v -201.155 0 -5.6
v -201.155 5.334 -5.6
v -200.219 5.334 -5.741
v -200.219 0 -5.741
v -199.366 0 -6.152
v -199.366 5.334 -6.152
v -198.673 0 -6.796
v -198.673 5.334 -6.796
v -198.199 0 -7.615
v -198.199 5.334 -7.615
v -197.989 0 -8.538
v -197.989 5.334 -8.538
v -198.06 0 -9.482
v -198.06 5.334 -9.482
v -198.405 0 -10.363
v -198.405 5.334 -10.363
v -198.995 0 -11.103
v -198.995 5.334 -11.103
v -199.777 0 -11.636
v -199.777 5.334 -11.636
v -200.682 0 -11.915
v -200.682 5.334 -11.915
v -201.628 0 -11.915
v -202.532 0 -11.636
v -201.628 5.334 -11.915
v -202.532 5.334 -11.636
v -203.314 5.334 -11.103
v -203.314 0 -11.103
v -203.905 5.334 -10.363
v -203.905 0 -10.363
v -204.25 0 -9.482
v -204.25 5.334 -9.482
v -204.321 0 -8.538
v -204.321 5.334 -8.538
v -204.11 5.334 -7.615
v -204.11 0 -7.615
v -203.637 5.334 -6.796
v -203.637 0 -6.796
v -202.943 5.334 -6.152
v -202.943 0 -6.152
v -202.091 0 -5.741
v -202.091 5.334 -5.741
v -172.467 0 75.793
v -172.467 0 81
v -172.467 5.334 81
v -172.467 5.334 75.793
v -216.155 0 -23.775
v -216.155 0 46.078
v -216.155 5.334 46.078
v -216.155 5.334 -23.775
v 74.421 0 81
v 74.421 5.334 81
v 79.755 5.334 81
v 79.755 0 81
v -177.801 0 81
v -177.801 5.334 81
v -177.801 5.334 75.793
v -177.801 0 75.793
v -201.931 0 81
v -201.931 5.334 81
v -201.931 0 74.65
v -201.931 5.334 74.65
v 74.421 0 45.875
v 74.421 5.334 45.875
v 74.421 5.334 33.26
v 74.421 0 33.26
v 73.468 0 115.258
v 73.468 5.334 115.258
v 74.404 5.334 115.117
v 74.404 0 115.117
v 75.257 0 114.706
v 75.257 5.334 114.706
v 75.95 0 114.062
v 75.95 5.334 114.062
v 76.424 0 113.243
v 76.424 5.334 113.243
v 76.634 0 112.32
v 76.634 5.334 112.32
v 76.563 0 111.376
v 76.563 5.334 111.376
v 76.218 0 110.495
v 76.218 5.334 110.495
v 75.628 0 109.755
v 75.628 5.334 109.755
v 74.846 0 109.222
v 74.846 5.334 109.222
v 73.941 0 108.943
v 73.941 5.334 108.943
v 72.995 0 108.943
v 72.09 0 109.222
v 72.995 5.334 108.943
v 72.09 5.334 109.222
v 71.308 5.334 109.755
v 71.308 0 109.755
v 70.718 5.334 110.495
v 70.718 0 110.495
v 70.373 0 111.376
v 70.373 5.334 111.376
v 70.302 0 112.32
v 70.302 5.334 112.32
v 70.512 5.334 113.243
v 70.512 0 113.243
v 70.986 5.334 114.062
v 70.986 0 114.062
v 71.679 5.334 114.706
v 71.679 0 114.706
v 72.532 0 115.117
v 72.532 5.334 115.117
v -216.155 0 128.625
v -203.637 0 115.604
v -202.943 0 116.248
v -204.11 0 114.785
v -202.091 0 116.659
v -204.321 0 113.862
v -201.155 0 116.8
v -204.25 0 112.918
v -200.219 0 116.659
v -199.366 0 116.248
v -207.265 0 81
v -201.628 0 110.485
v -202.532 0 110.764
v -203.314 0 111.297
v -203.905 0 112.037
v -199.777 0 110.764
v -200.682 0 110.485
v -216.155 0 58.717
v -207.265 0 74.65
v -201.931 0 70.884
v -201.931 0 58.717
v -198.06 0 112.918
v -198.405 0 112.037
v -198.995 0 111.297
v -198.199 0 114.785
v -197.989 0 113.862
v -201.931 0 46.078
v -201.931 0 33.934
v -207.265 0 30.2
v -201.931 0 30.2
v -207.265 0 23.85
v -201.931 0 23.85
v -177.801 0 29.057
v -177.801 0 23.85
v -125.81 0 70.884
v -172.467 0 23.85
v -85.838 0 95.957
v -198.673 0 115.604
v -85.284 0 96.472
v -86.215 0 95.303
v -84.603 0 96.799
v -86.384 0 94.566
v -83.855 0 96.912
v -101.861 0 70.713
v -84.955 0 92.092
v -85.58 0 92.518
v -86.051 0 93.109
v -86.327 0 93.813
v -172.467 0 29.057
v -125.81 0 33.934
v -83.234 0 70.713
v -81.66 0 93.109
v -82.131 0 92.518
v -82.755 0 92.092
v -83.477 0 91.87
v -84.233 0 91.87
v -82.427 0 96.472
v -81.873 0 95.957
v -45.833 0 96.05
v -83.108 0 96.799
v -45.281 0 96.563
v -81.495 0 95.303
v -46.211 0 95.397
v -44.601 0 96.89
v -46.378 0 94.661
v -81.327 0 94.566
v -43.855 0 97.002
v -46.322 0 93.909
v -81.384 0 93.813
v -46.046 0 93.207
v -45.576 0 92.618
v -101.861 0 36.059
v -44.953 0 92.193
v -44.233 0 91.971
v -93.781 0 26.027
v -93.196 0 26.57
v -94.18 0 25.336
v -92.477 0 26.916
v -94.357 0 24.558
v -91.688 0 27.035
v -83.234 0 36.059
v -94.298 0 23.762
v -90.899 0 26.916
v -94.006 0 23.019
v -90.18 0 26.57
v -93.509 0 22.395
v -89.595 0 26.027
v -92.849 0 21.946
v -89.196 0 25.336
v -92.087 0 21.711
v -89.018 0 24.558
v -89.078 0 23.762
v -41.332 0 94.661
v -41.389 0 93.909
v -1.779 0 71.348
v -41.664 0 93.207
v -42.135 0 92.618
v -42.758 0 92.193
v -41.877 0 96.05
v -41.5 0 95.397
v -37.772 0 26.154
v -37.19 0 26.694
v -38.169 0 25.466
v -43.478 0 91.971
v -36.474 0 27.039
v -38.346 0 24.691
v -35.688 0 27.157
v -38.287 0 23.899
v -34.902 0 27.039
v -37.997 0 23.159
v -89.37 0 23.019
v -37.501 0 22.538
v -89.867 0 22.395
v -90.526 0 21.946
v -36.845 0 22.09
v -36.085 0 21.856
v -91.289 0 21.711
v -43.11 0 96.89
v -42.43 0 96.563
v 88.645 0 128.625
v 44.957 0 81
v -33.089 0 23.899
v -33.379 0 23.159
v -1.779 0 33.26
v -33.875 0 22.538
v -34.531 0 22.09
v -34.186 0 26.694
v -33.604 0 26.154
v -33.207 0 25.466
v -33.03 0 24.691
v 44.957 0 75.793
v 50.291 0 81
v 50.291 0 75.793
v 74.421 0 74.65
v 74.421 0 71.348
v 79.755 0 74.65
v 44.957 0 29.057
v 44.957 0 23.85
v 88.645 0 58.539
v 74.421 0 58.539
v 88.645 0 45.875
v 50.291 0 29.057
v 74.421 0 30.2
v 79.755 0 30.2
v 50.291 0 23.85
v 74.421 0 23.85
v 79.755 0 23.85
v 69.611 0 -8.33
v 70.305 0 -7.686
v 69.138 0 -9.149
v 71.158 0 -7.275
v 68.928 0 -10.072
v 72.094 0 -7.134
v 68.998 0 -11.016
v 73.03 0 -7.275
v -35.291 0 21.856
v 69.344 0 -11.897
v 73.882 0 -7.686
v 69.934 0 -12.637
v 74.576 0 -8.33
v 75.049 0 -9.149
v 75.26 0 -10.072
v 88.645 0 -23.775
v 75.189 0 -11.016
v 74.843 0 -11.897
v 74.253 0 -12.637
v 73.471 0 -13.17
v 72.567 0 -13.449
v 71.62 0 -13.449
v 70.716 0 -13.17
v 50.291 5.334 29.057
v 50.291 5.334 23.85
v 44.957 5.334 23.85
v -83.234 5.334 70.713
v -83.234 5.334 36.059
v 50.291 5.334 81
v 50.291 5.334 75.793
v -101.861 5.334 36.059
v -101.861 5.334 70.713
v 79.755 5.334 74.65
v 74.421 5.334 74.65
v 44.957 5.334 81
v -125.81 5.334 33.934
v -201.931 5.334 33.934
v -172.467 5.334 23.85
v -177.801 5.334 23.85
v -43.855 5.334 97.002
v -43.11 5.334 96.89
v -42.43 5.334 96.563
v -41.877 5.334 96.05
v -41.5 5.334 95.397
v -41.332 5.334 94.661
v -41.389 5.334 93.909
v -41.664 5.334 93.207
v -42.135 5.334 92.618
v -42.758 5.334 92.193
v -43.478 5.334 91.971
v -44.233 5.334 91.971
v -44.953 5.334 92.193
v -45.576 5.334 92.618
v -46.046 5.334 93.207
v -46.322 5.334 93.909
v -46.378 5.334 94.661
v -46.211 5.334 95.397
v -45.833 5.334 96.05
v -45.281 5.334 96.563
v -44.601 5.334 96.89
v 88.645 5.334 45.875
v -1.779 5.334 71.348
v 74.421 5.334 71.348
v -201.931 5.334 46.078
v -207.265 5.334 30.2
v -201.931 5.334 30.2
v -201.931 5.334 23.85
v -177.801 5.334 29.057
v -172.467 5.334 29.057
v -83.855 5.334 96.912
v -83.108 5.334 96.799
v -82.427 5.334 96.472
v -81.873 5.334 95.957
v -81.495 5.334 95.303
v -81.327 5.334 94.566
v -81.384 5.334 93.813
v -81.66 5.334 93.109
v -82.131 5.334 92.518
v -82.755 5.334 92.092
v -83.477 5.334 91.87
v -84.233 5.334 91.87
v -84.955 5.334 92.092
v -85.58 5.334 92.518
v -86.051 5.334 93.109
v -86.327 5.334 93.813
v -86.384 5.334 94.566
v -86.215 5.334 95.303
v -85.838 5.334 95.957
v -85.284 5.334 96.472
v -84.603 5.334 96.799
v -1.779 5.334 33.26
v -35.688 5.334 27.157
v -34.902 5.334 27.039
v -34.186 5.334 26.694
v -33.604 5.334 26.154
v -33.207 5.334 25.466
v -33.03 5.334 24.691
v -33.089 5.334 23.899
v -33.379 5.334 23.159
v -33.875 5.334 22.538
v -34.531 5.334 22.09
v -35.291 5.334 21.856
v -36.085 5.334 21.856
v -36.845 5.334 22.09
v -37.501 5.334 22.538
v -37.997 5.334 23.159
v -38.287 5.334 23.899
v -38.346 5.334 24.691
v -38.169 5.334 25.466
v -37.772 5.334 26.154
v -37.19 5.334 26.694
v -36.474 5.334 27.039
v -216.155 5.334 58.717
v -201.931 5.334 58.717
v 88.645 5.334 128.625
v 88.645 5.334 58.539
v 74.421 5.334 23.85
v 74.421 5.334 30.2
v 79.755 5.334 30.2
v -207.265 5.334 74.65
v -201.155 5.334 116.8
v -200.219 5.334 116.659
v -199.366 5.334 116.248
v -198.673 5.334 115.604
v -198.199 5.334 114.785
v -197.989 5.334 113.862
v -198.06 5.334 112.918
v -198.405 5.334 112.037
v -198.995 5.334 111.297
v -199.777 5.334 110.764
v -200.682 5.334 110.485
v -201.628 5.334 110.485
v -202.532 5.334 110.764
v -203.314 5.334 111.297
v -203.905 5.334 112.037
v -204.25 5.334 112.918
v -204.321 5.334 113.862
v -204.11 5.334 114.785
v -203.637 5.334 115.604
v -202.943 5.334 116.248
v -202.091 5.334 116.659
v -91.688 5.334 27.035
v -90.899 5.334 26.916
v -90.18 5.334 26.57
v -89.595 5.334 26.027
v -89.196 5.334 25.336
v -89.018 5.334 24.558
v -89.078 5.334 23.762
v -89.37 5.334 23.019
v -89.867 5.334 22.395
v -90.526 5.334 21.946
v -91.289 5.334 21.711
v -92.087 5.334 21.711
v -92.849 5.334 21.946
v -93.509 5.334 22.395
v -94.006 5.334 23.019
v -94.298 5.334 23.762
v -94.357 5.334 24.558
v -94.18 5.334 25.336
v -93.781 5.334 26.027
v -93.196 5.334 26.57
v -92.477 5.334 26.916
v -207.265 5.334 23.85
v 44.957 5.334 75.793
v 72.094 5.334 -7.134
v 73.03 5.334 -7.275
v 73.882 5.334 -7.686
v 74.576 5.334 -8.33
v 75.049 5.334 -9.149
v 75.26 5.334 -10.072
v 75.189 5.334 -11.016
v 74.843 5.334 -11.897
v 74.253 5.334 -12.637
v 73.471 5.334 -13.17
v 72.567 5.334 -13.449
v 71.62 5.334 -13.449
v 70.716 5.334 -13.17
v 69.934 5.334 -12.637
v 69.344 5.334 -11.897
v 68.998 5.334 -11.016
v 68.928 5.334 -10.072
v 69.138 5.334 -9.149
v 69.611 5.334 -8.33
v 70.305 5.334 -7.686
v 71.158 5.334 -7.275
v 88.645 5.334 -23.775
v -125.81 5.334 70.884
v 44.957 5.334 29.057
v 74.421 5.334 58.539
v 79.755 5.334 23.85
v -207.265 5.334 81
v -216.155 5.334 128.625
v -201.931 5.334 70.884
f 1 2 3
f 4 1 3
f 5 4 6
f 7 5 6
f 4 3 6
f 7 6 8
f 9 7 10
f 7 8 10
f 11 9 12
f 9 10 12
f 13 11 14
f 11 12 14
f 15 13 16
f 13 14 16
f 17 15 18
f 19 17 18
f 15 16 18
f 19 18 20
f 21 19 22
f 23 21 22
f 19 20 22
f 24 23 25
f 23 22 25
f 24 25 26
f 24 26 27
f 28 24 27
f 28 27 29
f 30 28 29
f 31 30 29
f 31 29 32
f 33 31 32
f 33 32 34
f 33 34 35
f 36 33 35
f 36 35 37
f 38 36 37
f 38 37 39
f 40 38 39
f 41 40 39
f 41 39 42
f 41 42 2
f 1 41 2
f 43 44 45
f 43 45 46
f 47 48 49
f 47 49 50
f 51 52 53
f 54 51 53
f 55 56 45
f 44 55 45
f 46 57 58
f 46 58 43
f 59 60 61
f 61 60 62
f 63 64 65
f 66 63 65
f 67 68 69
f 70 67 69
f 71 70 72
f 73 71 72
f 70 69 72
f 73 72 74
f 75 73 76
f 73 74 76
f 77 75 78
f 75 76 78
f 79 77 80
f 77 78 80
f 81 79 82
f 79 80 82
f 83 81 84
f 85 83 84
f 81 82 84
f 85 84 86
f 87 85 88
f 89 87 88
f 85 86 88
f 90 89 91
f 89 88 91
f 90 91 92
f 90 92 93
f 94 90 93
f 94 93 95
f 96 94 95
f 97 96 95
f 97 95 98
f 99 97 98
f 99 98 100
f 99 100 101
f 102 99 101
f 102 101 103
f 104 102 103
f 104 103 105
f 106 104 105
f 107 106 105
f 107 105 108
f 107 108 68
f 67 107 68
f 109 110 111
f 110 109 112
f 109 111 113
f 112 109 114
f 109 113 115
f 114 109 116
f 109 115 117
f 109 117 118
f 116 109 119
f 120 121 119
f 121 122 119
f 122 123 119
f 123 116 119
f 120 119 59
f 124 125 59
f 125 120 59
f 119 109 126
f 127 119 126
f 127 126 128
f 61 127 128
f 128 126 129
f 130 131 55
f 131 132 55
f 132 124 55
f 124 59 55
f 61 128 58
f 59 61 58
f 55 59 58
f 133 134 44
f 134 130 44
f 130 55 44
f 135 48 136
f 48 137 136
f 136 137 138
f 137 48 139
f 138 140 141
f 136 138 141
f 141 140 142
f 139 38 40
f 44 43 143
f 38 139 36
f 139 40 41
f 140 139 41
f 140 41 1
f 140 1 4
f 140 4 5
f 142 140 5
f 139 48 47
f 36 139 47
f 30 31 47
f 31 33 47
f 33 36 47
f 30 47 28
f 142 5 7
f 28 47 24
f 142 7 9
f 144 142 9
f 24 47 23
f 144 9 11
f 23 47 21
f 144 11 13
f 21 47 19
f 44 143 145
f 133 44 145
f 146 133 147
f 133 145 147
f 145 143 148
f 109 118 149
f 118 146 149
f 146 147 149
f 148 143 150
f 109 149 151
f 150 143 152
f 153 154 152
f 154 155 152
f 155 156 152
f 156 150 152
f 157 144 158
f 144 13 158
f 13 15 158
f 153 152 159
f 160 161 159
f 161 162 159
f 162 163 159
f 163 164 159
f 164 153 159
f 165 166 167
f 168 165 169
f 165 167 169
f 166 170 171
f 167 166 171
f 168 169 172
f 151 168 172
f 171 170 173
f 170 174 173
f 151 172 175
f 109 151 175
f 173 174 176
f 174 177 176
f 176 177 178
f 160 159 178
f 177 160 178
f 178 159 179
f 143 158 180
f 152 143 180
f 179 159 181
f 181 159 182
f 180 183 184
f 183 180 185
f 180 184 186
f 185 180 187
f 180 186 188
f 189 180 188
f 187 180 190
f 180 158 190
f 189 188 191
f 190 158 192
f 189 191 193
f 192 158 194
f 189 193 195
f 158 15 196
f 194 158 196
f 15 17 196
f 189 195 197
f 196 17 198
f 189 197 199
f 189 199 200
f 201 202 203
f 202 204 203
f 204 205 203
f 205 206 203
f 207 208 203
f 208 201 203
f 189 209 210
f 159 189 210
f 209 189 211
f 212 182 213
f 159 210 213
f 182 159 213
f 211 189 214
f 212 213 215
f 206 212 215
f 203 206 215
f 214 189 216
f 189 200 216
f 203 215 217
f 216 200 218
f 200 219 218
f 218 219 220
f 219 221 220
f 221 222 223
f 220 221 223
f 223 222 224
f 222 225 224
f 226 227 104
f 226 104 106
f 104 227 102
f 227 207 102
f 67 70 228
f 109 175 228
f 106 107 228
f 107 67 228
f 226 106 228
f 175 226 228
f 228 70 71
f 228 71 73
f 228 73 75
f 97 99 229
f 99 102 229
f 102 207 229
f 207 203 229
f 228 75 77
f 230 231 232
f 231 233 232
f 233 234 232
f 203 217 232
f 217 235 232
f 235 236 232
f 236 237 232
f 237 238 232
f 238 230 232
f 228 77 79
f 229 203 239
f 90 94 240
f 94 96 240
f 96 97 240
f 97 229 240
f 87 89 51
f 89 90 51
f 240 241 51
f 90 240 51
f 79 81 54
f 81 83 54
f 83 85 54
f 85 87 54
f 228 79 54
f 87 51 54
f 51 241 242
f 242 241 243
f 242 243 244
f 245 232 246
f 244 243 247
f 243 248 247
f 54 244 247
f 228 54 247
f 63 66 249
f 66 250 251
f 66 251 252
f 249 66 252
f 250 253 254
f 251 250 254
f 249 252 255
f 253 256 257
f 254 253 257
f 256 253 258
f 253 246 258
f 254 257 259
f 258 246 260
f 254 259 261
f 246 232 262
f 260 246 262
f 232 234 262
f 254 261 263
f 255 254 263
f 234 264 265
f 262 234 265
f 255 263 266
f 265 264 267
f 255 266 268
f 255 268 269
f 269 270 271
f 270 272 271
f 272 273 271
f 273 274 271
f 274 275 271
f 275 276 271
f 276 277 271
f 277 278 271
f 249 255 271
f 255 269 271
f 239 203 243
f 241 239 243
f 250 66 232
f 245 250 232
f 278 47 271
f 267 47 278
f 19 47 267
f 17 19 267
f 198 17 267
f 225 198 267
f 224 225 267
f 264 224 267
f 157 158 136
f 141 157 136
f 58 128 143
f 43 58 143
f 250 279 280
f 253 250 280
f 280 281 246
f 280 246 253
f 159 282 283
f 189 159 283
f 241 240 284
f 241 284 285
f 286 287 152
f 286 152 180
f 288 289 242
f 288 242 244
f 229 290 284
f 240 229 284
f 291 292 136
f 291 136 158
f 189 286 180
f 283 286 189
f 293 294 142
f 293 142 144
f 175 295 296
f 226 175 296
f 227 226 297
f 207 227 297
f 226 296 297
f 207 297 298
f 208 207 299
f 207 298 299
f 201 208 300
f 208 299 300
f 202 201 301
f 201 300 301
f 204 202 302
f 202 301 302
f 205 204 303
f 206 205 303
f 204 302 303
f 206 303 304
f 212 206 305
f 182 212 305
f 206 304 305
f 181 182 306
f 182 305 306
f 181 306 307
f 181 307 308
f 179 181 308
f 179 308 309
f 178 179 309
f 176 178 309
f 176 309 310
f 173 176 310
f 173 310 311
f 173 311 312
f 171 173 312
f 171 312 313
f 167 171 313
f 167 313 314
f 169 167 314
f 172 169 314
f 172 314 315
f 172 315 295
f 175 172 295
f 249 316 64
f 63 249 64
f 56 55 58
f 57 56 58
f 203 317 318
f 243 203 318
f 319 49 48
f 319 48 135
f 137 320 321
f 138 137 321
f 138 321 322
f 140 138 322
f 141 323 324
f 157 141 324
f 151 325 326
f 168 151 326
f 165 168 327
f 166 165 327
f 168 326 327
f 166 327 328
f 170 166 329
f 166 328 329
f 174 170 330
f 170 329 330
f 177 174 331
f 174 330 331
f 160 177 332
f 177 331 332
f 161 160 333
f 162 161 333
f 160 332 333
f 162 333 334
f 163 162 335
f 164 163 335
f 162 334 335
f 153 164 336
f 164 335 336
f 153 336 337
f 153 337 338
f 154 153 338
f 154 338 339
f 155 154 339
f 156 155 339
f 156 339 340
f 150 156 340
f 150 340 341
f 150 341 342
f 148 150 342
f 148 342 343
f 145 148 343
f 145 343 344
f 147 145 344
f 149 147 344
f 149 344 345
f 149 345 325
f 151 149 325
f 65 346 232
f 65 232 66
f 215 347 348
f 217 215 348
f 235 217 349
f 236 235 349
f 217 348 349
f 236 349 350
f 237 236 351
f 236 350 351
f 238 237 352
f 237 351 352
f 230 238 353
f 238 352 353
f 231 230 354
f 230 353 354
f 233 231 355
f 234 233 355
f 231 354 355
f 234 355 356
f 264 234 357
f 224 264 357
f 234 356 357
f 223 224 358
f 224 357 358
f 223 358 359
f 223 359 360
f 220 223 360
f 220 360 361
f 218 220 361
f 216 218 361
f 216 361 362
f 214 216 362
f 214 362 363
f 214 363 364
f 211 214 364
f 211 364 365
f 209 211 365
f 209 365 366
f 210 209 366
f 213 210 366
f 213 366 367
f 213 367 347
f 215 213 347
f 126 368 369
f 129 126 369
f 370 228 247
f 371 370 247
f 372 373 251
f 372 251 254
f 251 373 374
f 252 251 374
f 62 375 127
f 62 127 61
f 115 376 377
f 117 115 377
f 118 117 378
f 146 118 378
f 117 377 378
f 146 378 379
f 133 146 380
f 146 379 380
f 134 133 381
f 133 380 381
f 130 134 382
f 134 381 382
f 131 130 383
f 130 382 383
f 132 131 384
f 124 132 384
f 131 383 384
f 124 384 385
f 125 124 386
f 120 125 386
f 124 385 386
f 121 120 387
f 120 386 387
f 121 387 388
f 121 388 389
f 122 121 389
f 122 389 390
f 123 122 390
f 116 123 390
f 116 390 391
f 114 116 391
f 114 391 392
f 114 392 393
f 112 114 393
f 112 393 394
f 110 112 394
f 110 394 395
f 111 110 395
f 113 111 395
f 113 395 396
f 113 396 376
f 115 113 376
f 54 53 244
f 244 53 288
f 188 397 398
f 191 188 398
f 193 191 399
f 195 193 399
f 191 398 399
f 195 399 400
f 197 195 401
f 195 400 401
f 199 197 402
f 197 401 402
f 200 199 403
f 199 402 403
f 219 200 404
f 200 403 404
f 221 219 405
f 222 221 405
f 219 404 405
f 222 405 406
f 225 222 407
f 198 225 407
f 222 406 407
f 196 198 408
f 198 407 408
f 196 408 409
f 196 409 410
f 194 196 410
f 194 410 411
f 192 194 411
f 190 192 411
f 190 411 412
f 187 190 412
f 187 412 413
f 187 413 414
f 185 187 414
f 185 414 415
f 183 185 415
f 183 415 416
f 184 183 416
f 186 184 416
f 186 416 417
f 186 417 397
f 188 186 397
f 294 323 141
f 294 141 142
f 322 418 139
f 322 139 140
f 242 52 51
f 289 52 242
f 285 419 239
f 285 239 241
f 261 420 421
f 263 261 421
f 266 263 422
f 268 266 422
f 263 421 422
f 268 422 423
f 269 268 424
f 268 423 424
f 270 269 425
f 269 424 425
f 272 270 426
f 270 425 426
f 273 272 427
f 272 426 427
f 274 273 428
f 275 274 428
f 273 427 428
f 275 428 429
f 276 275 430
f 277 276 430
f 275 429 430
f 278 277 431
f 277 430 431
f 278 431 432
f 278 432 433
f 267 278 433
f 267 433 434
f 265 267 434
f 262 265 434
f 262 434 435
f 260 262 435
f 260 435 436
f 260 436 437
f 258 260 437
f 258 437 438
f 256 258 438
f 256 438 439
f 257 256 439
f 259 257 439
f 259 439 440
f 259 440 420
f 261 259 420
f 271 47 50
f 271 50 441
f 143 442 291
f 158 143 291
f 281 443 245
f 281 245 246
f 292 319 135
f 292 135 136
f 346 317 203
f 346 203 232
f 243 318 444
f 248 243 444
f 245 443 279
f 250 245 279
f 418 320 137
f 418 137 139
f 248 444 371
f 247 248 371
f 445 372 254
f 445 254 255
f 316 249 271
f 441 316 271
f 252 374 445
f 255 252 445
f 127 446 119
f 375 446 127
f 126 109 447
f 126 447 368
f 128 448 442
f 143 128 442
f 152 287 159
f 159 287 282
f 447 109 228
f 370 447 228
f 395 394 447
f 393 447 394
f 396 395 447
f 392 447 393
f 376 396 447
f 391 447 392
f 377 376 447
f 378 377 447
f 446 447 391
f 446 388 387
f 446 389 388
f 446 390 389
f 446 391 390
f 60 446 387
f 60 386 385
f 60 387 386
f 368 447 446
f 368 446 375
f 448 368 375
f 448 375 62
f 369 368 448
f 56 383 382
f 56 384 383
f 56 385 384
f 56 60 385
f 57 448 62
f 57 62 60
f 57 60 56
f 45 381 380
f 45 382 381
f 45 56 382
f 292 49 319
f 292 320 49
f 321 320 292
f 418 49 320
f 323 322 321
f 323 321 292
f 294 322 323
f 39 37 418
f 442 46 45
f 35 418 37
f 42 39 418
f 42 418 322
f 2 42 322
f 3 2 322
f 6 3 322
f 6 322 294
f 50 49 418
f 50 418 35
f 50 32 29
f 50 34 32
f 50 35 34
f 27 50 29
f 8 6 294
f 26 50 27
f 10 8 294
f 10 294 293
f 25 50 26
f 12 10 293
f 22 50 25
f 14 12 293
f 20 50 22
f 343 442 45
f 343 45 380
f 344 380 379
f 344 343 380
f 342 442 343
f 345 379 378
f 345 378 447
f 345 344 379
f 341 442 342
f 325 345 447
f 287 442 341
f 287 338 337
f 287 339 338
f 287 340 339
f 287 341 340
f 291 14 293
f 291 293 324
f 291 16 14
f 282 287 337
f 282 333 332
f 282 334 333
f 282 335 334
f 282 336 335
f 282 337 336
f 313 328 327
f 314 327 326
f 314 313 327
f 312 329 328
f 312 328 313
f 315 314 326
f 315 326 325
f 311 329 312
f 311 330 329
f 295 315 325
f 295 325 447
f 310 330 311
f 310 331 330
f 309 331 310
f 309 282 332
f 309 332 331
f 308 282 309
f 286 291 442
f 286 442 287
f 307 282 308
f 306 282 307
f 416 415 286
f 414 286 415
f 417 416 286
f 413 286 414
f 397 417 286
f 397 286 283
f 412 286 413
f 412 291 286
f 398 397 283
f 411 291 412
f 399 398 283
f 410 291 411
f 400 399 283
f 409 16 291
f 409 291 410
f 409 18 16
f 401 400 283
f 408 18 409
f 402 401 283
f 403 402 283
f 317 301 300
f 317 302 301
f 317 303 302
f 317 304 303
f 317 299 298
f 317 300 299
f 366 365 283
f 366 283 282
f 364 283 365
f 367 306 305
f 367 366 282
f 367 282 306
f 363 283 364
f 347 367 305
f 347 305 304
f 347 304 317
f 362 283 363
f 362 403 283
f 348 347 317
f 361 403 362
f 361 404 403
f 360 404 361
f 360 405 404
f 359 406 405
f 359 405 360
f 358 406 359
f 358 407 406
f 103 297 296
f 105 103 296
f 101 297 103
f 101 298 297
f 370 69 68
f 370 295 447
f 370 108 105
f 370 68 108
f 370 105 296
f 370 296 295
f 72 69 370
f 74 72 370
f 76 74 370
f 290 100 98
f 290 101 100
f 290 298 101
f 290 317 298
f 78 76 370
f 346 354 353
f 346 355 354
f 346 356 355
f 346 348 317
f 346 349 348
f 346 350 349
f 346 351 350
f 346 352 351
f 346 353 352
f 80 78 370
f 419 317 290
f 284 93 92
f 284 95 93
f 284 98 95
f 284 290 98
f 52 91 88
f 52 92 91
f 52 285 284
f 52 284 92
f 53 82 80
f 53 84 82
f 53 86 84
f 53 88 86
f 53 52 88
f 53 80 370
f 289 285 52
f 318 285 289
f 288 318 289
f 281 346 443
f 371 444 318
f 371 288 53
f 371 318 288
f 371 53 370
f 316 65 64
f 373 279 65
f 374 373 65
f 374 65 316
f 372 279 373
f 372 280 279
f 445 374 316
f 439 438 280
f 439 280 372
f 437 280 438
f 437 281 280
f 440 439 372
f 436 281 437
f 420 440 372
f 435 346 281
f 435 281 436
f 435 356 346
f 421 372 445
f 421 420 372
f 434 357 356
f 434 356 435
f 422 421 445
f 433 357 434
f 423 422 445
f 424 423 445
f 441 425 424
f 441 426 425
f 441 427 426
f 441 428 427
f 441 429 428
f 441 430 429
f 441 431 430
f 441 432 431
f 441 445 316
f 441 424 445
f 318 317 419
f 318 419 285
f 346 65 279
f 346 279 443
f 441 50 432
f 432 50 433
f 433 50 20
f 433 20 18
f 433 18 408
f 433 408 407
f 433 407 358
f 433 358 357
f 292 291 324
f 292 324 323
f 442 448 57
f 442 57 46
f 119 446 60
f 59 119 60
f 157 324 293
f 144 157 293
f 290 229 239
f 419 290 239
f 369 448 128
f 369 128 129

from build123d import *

# Parameters (mm, degrees)
SKETCH1_W           = 304.8
SKETCH1_H           = 152.4
BOSS_EXTRUDE1_DEPTH = 5.334
SKETCH2_R           = 3.175
CUT_EXTRUDE1_DEPTH  = 10
SKETCH4_R           = 2.676950891
SKETCH4_R_2         = 2.665674254
SKETCH4_R_3         = 2.530032229
SKETCH4_R_4         = 2.5353316
CUT_EXTRUDE3_DEPTH  = 252.586384458
SKETCH5_W           = 5.334
SKETCH5_H           = 6.35
SKETCH5_H_2         = 5.207
CUT_EXTRUDE4_DEPTH  = 252.586384458
SKETCH8_W           = 76.2
SKETCH8_H           = 34.29
CUT_EXTRUDE5_DEPTH  = 252.586384458
SKETCH10_W          = 76.2
SKETCH10_H          = 1.778250289
SKETCH10_H_2        = 2.019413315
CUT_EXTRUDE7_DEPTH  = 252.586384458
SKETCH11_W          = 76.121070341
SKETCH11_H          = 36.949838164
CUT_EXTRUDE8_DEPTH  = 252.586384458
SKETCH12_W          = 14.224
SKETCH12_H          = 12.638991695
CUT_EXTRUDE9_DEPTH  = 252.586384458
SKETCH13_W          = 18.627313318
SKETCH13_H          = 34.653875248
CUT_EXTRUDE10_DEPTH = 252.586384458
CUT_EXTRUDE11_DEPTH = 252.586384458


with BuildPart() as part:
    # Sketch1 → Boss-Extrude1 (new body)
    with BuildSketch(Plane(origin=(0, 0, 0), x_dir=(1, 0, 0), z_dir=(0, 1, 0))):
        with Locations((-63.754910023, -52.424694992)):
            Rectangle(SKETCH1_W, SKETCH1_H)
    extrude(amount=BOSS_EXTRUDE1_DEPTH)

    # Sketch2 → Cut-Extrude1 (cut)
    with BuildSketch(Plane(origin=(0, 5.334, 0), x_dir=(1, 0, 0), z_dir=(0, 1, 0))):
        with Locations(Location((-201.154910023, -113.624694992, 0), (0, 0, 270))):
            Circle(SKETCH2_R)
        with Locations(Location((-201.154910023, 8.775305008, 0), (0, 0, 270))):
            Circle(SKETCH2_R)
        with Locations(Location((73.468003191, -112.082866523, 0), (0, 0, 270))):
            Circle(SKETCH2_R)
        with Locations(Location((72.093654241, 10.309417404, 0), (0, 0, 270))):
            Circle(SKETCH2_R)
    extrude(amount=-CUT_EXTRUDE1_DEPTH, mode=Mode.SUBTRACT)

    # Sketch4 → Cut-Extrude3 (cut, through all)
    with BuildSketch(Plane(origin=(0, 5.334, 0), x_dir=(1, 0, 0), z_dir=(0, 1, 0))):
        with Locations(Location((-91.687860004, -24.357805151, 0), (0, 0, 270))):
            Circle(SKETCH4_R)
        with Locations(Location((-35.688020182, -24.491745011, 0), (0, 0, 270))):
            Circle(SKETCH4_R_2)
        with Locations(Location((-43.855422124, -94.472410523, 0), (0, 0, 270))):
            Circle(SKETCH4_R_3)
        with Locations(Location((-83.855307711, -94.376739195, 0), (0, 0, 270))):
            Circle(SKETCH4_R_4)
    extrude(amount=-CUT_EXTRUDE3_DEPTH, mode=Mode.SUBTRACT)

    # Sketch5 → Cut-Extrude4 (cut, through all)
    with BuildSketch(Plane(origin=(0, 5.334, 0), x_dir=(1, 0, 0), z_dir=(0, 1, 0))):
        with Locations((-204.597910023, -77.824694992)):
            Rectangle(SKETCH5_W, SKETCH5_H)
        with Locations((-204.597910023, -27.024694992)):
            Rectangle(SKETCH5_W, SKETCH5_H)
        with Locations((-175.133910023, -26.453194992)):
            Rectangle(SKETCH5_W, SKETCH5_H_2)
        with Locations((-175.133910023, -78.396194992)):
            Rectangle(SKETCH5_W, SKETCH5_H_2)
        with Locations((77.088089977, -77.824694992)):
            Rectangle(SKETCH5_W, SKETCH5_H)
        with Locations((47.624089977, -78.396194992)):
            Rectangle(SKETCH5_W, SKETCH5_H_2)
        with Locations((77.088089977, -27.024694992)):
            Rectangle(SKETCH5_W, SKETCH5_H)
        with Locations((47.624089977, -26.453194992)):
            Rectangle(SKETCH5_W, SKETCH5_H_2)
    extrude(amount=-CUT_EXTRUDE4_DEPTH, mode=Mode.SUBTRACT)

    # Sketch8 → Cut-Extrude5 (cut, through all)
    with BuildSketch(Plane(origin=(0, 5.334, 0), x_dir=(1, 0, 0), z_dir=(0, 1, 0))):
        with Locations((36.321089977, -52.424694992)):
            Rectangle(SKETCH8_W, SKETCH8_H)
    extrude(amount=-CUT_EXTRUDE5_DEPTH, mode=Mode.SUBTRACT)

    # Sketch10 → Cut-Extrude7 (cut, through all)
    with BuildSketch(Plane(origin=(0, 5.334, 0), x_dir=(1, 0, 0), z_dir=(0, 1, 0))):
        with Locations((36.321089977, -70.458820137)):
            Rectangle(SKETCH10_W, SKETCH10_H)
        with Locations((36.321089977, -34.269988334)):
            Rectangle(SKETCH10_W, SKETCH10_H_2)
    extrude(amount=-CUT_EXTRUDE7_DEPTH, mode=Mode.SUBTRACT)

    # Sketch11 → Cut-Extrude8 (cut, through all)
    with BuildSketch(Plane(origin=(0, 5.334, 0), x_dir=(1, 0, 0), z_dir=(0, 1, 0))):
        with Locations((-163.870374853, -52.409398233)):
            Rectangle(SKETCH11_W, SKETCH11_H)
    extrude(amount=-CUT_EXTRUDE8_DEPTH, mode=Mode.SUBTRACT)

    # Sketch12 → Cut-Extrude9 (cut, through all)
    with BuildSketch(Plane(origin=(0, 5.334, 0), x_dir=(1, 0, 0), z_dir=(0, 1, 0))):
        with Locations((-209.042910023, -52.397947161)):
            Rectangle(SKETCH12_W, SKETCH12_H)
    extrude(amount=-CUT_EXTRUDE9_DEPTH, mode=Mode.SUBTRACT)

    # Sketch13 → Cut-Extrude10 (cut, through all)
    with BuildSketch(Plane(origin=(0, 5.334, 0), x_dir=(1, 0, 0), z_dir=(0, 1, 0))):
        with Locations((-92.547768292, -53.386052829)):
            Rectangle(SKETCH13_W, SKETCH13_H)
    extrude(amount=-CUT_EXTRUDE10_DEPTH, mode=Mode.SUBTRACT)

    # Sketch14 → Cut-Extrude11 (cut, through all)
    with BuildSketch(Plane(origin=(0, 5.334, 0), x_dir=(1, 0, 0), z_dir=(0, 1, 0))):
        Polygon((74.421089977, -52.304113479), (74.421089977, -58.539435279), (88.645089977, -58.539435279), (88.645089977, -45.874866735), (74.421089977, -45.874866735), align=None)
    extrude(amount=-CUT_EXTRUDE11_DEPTH, mode=Mode.SUBTRACT)


solid = part.part
